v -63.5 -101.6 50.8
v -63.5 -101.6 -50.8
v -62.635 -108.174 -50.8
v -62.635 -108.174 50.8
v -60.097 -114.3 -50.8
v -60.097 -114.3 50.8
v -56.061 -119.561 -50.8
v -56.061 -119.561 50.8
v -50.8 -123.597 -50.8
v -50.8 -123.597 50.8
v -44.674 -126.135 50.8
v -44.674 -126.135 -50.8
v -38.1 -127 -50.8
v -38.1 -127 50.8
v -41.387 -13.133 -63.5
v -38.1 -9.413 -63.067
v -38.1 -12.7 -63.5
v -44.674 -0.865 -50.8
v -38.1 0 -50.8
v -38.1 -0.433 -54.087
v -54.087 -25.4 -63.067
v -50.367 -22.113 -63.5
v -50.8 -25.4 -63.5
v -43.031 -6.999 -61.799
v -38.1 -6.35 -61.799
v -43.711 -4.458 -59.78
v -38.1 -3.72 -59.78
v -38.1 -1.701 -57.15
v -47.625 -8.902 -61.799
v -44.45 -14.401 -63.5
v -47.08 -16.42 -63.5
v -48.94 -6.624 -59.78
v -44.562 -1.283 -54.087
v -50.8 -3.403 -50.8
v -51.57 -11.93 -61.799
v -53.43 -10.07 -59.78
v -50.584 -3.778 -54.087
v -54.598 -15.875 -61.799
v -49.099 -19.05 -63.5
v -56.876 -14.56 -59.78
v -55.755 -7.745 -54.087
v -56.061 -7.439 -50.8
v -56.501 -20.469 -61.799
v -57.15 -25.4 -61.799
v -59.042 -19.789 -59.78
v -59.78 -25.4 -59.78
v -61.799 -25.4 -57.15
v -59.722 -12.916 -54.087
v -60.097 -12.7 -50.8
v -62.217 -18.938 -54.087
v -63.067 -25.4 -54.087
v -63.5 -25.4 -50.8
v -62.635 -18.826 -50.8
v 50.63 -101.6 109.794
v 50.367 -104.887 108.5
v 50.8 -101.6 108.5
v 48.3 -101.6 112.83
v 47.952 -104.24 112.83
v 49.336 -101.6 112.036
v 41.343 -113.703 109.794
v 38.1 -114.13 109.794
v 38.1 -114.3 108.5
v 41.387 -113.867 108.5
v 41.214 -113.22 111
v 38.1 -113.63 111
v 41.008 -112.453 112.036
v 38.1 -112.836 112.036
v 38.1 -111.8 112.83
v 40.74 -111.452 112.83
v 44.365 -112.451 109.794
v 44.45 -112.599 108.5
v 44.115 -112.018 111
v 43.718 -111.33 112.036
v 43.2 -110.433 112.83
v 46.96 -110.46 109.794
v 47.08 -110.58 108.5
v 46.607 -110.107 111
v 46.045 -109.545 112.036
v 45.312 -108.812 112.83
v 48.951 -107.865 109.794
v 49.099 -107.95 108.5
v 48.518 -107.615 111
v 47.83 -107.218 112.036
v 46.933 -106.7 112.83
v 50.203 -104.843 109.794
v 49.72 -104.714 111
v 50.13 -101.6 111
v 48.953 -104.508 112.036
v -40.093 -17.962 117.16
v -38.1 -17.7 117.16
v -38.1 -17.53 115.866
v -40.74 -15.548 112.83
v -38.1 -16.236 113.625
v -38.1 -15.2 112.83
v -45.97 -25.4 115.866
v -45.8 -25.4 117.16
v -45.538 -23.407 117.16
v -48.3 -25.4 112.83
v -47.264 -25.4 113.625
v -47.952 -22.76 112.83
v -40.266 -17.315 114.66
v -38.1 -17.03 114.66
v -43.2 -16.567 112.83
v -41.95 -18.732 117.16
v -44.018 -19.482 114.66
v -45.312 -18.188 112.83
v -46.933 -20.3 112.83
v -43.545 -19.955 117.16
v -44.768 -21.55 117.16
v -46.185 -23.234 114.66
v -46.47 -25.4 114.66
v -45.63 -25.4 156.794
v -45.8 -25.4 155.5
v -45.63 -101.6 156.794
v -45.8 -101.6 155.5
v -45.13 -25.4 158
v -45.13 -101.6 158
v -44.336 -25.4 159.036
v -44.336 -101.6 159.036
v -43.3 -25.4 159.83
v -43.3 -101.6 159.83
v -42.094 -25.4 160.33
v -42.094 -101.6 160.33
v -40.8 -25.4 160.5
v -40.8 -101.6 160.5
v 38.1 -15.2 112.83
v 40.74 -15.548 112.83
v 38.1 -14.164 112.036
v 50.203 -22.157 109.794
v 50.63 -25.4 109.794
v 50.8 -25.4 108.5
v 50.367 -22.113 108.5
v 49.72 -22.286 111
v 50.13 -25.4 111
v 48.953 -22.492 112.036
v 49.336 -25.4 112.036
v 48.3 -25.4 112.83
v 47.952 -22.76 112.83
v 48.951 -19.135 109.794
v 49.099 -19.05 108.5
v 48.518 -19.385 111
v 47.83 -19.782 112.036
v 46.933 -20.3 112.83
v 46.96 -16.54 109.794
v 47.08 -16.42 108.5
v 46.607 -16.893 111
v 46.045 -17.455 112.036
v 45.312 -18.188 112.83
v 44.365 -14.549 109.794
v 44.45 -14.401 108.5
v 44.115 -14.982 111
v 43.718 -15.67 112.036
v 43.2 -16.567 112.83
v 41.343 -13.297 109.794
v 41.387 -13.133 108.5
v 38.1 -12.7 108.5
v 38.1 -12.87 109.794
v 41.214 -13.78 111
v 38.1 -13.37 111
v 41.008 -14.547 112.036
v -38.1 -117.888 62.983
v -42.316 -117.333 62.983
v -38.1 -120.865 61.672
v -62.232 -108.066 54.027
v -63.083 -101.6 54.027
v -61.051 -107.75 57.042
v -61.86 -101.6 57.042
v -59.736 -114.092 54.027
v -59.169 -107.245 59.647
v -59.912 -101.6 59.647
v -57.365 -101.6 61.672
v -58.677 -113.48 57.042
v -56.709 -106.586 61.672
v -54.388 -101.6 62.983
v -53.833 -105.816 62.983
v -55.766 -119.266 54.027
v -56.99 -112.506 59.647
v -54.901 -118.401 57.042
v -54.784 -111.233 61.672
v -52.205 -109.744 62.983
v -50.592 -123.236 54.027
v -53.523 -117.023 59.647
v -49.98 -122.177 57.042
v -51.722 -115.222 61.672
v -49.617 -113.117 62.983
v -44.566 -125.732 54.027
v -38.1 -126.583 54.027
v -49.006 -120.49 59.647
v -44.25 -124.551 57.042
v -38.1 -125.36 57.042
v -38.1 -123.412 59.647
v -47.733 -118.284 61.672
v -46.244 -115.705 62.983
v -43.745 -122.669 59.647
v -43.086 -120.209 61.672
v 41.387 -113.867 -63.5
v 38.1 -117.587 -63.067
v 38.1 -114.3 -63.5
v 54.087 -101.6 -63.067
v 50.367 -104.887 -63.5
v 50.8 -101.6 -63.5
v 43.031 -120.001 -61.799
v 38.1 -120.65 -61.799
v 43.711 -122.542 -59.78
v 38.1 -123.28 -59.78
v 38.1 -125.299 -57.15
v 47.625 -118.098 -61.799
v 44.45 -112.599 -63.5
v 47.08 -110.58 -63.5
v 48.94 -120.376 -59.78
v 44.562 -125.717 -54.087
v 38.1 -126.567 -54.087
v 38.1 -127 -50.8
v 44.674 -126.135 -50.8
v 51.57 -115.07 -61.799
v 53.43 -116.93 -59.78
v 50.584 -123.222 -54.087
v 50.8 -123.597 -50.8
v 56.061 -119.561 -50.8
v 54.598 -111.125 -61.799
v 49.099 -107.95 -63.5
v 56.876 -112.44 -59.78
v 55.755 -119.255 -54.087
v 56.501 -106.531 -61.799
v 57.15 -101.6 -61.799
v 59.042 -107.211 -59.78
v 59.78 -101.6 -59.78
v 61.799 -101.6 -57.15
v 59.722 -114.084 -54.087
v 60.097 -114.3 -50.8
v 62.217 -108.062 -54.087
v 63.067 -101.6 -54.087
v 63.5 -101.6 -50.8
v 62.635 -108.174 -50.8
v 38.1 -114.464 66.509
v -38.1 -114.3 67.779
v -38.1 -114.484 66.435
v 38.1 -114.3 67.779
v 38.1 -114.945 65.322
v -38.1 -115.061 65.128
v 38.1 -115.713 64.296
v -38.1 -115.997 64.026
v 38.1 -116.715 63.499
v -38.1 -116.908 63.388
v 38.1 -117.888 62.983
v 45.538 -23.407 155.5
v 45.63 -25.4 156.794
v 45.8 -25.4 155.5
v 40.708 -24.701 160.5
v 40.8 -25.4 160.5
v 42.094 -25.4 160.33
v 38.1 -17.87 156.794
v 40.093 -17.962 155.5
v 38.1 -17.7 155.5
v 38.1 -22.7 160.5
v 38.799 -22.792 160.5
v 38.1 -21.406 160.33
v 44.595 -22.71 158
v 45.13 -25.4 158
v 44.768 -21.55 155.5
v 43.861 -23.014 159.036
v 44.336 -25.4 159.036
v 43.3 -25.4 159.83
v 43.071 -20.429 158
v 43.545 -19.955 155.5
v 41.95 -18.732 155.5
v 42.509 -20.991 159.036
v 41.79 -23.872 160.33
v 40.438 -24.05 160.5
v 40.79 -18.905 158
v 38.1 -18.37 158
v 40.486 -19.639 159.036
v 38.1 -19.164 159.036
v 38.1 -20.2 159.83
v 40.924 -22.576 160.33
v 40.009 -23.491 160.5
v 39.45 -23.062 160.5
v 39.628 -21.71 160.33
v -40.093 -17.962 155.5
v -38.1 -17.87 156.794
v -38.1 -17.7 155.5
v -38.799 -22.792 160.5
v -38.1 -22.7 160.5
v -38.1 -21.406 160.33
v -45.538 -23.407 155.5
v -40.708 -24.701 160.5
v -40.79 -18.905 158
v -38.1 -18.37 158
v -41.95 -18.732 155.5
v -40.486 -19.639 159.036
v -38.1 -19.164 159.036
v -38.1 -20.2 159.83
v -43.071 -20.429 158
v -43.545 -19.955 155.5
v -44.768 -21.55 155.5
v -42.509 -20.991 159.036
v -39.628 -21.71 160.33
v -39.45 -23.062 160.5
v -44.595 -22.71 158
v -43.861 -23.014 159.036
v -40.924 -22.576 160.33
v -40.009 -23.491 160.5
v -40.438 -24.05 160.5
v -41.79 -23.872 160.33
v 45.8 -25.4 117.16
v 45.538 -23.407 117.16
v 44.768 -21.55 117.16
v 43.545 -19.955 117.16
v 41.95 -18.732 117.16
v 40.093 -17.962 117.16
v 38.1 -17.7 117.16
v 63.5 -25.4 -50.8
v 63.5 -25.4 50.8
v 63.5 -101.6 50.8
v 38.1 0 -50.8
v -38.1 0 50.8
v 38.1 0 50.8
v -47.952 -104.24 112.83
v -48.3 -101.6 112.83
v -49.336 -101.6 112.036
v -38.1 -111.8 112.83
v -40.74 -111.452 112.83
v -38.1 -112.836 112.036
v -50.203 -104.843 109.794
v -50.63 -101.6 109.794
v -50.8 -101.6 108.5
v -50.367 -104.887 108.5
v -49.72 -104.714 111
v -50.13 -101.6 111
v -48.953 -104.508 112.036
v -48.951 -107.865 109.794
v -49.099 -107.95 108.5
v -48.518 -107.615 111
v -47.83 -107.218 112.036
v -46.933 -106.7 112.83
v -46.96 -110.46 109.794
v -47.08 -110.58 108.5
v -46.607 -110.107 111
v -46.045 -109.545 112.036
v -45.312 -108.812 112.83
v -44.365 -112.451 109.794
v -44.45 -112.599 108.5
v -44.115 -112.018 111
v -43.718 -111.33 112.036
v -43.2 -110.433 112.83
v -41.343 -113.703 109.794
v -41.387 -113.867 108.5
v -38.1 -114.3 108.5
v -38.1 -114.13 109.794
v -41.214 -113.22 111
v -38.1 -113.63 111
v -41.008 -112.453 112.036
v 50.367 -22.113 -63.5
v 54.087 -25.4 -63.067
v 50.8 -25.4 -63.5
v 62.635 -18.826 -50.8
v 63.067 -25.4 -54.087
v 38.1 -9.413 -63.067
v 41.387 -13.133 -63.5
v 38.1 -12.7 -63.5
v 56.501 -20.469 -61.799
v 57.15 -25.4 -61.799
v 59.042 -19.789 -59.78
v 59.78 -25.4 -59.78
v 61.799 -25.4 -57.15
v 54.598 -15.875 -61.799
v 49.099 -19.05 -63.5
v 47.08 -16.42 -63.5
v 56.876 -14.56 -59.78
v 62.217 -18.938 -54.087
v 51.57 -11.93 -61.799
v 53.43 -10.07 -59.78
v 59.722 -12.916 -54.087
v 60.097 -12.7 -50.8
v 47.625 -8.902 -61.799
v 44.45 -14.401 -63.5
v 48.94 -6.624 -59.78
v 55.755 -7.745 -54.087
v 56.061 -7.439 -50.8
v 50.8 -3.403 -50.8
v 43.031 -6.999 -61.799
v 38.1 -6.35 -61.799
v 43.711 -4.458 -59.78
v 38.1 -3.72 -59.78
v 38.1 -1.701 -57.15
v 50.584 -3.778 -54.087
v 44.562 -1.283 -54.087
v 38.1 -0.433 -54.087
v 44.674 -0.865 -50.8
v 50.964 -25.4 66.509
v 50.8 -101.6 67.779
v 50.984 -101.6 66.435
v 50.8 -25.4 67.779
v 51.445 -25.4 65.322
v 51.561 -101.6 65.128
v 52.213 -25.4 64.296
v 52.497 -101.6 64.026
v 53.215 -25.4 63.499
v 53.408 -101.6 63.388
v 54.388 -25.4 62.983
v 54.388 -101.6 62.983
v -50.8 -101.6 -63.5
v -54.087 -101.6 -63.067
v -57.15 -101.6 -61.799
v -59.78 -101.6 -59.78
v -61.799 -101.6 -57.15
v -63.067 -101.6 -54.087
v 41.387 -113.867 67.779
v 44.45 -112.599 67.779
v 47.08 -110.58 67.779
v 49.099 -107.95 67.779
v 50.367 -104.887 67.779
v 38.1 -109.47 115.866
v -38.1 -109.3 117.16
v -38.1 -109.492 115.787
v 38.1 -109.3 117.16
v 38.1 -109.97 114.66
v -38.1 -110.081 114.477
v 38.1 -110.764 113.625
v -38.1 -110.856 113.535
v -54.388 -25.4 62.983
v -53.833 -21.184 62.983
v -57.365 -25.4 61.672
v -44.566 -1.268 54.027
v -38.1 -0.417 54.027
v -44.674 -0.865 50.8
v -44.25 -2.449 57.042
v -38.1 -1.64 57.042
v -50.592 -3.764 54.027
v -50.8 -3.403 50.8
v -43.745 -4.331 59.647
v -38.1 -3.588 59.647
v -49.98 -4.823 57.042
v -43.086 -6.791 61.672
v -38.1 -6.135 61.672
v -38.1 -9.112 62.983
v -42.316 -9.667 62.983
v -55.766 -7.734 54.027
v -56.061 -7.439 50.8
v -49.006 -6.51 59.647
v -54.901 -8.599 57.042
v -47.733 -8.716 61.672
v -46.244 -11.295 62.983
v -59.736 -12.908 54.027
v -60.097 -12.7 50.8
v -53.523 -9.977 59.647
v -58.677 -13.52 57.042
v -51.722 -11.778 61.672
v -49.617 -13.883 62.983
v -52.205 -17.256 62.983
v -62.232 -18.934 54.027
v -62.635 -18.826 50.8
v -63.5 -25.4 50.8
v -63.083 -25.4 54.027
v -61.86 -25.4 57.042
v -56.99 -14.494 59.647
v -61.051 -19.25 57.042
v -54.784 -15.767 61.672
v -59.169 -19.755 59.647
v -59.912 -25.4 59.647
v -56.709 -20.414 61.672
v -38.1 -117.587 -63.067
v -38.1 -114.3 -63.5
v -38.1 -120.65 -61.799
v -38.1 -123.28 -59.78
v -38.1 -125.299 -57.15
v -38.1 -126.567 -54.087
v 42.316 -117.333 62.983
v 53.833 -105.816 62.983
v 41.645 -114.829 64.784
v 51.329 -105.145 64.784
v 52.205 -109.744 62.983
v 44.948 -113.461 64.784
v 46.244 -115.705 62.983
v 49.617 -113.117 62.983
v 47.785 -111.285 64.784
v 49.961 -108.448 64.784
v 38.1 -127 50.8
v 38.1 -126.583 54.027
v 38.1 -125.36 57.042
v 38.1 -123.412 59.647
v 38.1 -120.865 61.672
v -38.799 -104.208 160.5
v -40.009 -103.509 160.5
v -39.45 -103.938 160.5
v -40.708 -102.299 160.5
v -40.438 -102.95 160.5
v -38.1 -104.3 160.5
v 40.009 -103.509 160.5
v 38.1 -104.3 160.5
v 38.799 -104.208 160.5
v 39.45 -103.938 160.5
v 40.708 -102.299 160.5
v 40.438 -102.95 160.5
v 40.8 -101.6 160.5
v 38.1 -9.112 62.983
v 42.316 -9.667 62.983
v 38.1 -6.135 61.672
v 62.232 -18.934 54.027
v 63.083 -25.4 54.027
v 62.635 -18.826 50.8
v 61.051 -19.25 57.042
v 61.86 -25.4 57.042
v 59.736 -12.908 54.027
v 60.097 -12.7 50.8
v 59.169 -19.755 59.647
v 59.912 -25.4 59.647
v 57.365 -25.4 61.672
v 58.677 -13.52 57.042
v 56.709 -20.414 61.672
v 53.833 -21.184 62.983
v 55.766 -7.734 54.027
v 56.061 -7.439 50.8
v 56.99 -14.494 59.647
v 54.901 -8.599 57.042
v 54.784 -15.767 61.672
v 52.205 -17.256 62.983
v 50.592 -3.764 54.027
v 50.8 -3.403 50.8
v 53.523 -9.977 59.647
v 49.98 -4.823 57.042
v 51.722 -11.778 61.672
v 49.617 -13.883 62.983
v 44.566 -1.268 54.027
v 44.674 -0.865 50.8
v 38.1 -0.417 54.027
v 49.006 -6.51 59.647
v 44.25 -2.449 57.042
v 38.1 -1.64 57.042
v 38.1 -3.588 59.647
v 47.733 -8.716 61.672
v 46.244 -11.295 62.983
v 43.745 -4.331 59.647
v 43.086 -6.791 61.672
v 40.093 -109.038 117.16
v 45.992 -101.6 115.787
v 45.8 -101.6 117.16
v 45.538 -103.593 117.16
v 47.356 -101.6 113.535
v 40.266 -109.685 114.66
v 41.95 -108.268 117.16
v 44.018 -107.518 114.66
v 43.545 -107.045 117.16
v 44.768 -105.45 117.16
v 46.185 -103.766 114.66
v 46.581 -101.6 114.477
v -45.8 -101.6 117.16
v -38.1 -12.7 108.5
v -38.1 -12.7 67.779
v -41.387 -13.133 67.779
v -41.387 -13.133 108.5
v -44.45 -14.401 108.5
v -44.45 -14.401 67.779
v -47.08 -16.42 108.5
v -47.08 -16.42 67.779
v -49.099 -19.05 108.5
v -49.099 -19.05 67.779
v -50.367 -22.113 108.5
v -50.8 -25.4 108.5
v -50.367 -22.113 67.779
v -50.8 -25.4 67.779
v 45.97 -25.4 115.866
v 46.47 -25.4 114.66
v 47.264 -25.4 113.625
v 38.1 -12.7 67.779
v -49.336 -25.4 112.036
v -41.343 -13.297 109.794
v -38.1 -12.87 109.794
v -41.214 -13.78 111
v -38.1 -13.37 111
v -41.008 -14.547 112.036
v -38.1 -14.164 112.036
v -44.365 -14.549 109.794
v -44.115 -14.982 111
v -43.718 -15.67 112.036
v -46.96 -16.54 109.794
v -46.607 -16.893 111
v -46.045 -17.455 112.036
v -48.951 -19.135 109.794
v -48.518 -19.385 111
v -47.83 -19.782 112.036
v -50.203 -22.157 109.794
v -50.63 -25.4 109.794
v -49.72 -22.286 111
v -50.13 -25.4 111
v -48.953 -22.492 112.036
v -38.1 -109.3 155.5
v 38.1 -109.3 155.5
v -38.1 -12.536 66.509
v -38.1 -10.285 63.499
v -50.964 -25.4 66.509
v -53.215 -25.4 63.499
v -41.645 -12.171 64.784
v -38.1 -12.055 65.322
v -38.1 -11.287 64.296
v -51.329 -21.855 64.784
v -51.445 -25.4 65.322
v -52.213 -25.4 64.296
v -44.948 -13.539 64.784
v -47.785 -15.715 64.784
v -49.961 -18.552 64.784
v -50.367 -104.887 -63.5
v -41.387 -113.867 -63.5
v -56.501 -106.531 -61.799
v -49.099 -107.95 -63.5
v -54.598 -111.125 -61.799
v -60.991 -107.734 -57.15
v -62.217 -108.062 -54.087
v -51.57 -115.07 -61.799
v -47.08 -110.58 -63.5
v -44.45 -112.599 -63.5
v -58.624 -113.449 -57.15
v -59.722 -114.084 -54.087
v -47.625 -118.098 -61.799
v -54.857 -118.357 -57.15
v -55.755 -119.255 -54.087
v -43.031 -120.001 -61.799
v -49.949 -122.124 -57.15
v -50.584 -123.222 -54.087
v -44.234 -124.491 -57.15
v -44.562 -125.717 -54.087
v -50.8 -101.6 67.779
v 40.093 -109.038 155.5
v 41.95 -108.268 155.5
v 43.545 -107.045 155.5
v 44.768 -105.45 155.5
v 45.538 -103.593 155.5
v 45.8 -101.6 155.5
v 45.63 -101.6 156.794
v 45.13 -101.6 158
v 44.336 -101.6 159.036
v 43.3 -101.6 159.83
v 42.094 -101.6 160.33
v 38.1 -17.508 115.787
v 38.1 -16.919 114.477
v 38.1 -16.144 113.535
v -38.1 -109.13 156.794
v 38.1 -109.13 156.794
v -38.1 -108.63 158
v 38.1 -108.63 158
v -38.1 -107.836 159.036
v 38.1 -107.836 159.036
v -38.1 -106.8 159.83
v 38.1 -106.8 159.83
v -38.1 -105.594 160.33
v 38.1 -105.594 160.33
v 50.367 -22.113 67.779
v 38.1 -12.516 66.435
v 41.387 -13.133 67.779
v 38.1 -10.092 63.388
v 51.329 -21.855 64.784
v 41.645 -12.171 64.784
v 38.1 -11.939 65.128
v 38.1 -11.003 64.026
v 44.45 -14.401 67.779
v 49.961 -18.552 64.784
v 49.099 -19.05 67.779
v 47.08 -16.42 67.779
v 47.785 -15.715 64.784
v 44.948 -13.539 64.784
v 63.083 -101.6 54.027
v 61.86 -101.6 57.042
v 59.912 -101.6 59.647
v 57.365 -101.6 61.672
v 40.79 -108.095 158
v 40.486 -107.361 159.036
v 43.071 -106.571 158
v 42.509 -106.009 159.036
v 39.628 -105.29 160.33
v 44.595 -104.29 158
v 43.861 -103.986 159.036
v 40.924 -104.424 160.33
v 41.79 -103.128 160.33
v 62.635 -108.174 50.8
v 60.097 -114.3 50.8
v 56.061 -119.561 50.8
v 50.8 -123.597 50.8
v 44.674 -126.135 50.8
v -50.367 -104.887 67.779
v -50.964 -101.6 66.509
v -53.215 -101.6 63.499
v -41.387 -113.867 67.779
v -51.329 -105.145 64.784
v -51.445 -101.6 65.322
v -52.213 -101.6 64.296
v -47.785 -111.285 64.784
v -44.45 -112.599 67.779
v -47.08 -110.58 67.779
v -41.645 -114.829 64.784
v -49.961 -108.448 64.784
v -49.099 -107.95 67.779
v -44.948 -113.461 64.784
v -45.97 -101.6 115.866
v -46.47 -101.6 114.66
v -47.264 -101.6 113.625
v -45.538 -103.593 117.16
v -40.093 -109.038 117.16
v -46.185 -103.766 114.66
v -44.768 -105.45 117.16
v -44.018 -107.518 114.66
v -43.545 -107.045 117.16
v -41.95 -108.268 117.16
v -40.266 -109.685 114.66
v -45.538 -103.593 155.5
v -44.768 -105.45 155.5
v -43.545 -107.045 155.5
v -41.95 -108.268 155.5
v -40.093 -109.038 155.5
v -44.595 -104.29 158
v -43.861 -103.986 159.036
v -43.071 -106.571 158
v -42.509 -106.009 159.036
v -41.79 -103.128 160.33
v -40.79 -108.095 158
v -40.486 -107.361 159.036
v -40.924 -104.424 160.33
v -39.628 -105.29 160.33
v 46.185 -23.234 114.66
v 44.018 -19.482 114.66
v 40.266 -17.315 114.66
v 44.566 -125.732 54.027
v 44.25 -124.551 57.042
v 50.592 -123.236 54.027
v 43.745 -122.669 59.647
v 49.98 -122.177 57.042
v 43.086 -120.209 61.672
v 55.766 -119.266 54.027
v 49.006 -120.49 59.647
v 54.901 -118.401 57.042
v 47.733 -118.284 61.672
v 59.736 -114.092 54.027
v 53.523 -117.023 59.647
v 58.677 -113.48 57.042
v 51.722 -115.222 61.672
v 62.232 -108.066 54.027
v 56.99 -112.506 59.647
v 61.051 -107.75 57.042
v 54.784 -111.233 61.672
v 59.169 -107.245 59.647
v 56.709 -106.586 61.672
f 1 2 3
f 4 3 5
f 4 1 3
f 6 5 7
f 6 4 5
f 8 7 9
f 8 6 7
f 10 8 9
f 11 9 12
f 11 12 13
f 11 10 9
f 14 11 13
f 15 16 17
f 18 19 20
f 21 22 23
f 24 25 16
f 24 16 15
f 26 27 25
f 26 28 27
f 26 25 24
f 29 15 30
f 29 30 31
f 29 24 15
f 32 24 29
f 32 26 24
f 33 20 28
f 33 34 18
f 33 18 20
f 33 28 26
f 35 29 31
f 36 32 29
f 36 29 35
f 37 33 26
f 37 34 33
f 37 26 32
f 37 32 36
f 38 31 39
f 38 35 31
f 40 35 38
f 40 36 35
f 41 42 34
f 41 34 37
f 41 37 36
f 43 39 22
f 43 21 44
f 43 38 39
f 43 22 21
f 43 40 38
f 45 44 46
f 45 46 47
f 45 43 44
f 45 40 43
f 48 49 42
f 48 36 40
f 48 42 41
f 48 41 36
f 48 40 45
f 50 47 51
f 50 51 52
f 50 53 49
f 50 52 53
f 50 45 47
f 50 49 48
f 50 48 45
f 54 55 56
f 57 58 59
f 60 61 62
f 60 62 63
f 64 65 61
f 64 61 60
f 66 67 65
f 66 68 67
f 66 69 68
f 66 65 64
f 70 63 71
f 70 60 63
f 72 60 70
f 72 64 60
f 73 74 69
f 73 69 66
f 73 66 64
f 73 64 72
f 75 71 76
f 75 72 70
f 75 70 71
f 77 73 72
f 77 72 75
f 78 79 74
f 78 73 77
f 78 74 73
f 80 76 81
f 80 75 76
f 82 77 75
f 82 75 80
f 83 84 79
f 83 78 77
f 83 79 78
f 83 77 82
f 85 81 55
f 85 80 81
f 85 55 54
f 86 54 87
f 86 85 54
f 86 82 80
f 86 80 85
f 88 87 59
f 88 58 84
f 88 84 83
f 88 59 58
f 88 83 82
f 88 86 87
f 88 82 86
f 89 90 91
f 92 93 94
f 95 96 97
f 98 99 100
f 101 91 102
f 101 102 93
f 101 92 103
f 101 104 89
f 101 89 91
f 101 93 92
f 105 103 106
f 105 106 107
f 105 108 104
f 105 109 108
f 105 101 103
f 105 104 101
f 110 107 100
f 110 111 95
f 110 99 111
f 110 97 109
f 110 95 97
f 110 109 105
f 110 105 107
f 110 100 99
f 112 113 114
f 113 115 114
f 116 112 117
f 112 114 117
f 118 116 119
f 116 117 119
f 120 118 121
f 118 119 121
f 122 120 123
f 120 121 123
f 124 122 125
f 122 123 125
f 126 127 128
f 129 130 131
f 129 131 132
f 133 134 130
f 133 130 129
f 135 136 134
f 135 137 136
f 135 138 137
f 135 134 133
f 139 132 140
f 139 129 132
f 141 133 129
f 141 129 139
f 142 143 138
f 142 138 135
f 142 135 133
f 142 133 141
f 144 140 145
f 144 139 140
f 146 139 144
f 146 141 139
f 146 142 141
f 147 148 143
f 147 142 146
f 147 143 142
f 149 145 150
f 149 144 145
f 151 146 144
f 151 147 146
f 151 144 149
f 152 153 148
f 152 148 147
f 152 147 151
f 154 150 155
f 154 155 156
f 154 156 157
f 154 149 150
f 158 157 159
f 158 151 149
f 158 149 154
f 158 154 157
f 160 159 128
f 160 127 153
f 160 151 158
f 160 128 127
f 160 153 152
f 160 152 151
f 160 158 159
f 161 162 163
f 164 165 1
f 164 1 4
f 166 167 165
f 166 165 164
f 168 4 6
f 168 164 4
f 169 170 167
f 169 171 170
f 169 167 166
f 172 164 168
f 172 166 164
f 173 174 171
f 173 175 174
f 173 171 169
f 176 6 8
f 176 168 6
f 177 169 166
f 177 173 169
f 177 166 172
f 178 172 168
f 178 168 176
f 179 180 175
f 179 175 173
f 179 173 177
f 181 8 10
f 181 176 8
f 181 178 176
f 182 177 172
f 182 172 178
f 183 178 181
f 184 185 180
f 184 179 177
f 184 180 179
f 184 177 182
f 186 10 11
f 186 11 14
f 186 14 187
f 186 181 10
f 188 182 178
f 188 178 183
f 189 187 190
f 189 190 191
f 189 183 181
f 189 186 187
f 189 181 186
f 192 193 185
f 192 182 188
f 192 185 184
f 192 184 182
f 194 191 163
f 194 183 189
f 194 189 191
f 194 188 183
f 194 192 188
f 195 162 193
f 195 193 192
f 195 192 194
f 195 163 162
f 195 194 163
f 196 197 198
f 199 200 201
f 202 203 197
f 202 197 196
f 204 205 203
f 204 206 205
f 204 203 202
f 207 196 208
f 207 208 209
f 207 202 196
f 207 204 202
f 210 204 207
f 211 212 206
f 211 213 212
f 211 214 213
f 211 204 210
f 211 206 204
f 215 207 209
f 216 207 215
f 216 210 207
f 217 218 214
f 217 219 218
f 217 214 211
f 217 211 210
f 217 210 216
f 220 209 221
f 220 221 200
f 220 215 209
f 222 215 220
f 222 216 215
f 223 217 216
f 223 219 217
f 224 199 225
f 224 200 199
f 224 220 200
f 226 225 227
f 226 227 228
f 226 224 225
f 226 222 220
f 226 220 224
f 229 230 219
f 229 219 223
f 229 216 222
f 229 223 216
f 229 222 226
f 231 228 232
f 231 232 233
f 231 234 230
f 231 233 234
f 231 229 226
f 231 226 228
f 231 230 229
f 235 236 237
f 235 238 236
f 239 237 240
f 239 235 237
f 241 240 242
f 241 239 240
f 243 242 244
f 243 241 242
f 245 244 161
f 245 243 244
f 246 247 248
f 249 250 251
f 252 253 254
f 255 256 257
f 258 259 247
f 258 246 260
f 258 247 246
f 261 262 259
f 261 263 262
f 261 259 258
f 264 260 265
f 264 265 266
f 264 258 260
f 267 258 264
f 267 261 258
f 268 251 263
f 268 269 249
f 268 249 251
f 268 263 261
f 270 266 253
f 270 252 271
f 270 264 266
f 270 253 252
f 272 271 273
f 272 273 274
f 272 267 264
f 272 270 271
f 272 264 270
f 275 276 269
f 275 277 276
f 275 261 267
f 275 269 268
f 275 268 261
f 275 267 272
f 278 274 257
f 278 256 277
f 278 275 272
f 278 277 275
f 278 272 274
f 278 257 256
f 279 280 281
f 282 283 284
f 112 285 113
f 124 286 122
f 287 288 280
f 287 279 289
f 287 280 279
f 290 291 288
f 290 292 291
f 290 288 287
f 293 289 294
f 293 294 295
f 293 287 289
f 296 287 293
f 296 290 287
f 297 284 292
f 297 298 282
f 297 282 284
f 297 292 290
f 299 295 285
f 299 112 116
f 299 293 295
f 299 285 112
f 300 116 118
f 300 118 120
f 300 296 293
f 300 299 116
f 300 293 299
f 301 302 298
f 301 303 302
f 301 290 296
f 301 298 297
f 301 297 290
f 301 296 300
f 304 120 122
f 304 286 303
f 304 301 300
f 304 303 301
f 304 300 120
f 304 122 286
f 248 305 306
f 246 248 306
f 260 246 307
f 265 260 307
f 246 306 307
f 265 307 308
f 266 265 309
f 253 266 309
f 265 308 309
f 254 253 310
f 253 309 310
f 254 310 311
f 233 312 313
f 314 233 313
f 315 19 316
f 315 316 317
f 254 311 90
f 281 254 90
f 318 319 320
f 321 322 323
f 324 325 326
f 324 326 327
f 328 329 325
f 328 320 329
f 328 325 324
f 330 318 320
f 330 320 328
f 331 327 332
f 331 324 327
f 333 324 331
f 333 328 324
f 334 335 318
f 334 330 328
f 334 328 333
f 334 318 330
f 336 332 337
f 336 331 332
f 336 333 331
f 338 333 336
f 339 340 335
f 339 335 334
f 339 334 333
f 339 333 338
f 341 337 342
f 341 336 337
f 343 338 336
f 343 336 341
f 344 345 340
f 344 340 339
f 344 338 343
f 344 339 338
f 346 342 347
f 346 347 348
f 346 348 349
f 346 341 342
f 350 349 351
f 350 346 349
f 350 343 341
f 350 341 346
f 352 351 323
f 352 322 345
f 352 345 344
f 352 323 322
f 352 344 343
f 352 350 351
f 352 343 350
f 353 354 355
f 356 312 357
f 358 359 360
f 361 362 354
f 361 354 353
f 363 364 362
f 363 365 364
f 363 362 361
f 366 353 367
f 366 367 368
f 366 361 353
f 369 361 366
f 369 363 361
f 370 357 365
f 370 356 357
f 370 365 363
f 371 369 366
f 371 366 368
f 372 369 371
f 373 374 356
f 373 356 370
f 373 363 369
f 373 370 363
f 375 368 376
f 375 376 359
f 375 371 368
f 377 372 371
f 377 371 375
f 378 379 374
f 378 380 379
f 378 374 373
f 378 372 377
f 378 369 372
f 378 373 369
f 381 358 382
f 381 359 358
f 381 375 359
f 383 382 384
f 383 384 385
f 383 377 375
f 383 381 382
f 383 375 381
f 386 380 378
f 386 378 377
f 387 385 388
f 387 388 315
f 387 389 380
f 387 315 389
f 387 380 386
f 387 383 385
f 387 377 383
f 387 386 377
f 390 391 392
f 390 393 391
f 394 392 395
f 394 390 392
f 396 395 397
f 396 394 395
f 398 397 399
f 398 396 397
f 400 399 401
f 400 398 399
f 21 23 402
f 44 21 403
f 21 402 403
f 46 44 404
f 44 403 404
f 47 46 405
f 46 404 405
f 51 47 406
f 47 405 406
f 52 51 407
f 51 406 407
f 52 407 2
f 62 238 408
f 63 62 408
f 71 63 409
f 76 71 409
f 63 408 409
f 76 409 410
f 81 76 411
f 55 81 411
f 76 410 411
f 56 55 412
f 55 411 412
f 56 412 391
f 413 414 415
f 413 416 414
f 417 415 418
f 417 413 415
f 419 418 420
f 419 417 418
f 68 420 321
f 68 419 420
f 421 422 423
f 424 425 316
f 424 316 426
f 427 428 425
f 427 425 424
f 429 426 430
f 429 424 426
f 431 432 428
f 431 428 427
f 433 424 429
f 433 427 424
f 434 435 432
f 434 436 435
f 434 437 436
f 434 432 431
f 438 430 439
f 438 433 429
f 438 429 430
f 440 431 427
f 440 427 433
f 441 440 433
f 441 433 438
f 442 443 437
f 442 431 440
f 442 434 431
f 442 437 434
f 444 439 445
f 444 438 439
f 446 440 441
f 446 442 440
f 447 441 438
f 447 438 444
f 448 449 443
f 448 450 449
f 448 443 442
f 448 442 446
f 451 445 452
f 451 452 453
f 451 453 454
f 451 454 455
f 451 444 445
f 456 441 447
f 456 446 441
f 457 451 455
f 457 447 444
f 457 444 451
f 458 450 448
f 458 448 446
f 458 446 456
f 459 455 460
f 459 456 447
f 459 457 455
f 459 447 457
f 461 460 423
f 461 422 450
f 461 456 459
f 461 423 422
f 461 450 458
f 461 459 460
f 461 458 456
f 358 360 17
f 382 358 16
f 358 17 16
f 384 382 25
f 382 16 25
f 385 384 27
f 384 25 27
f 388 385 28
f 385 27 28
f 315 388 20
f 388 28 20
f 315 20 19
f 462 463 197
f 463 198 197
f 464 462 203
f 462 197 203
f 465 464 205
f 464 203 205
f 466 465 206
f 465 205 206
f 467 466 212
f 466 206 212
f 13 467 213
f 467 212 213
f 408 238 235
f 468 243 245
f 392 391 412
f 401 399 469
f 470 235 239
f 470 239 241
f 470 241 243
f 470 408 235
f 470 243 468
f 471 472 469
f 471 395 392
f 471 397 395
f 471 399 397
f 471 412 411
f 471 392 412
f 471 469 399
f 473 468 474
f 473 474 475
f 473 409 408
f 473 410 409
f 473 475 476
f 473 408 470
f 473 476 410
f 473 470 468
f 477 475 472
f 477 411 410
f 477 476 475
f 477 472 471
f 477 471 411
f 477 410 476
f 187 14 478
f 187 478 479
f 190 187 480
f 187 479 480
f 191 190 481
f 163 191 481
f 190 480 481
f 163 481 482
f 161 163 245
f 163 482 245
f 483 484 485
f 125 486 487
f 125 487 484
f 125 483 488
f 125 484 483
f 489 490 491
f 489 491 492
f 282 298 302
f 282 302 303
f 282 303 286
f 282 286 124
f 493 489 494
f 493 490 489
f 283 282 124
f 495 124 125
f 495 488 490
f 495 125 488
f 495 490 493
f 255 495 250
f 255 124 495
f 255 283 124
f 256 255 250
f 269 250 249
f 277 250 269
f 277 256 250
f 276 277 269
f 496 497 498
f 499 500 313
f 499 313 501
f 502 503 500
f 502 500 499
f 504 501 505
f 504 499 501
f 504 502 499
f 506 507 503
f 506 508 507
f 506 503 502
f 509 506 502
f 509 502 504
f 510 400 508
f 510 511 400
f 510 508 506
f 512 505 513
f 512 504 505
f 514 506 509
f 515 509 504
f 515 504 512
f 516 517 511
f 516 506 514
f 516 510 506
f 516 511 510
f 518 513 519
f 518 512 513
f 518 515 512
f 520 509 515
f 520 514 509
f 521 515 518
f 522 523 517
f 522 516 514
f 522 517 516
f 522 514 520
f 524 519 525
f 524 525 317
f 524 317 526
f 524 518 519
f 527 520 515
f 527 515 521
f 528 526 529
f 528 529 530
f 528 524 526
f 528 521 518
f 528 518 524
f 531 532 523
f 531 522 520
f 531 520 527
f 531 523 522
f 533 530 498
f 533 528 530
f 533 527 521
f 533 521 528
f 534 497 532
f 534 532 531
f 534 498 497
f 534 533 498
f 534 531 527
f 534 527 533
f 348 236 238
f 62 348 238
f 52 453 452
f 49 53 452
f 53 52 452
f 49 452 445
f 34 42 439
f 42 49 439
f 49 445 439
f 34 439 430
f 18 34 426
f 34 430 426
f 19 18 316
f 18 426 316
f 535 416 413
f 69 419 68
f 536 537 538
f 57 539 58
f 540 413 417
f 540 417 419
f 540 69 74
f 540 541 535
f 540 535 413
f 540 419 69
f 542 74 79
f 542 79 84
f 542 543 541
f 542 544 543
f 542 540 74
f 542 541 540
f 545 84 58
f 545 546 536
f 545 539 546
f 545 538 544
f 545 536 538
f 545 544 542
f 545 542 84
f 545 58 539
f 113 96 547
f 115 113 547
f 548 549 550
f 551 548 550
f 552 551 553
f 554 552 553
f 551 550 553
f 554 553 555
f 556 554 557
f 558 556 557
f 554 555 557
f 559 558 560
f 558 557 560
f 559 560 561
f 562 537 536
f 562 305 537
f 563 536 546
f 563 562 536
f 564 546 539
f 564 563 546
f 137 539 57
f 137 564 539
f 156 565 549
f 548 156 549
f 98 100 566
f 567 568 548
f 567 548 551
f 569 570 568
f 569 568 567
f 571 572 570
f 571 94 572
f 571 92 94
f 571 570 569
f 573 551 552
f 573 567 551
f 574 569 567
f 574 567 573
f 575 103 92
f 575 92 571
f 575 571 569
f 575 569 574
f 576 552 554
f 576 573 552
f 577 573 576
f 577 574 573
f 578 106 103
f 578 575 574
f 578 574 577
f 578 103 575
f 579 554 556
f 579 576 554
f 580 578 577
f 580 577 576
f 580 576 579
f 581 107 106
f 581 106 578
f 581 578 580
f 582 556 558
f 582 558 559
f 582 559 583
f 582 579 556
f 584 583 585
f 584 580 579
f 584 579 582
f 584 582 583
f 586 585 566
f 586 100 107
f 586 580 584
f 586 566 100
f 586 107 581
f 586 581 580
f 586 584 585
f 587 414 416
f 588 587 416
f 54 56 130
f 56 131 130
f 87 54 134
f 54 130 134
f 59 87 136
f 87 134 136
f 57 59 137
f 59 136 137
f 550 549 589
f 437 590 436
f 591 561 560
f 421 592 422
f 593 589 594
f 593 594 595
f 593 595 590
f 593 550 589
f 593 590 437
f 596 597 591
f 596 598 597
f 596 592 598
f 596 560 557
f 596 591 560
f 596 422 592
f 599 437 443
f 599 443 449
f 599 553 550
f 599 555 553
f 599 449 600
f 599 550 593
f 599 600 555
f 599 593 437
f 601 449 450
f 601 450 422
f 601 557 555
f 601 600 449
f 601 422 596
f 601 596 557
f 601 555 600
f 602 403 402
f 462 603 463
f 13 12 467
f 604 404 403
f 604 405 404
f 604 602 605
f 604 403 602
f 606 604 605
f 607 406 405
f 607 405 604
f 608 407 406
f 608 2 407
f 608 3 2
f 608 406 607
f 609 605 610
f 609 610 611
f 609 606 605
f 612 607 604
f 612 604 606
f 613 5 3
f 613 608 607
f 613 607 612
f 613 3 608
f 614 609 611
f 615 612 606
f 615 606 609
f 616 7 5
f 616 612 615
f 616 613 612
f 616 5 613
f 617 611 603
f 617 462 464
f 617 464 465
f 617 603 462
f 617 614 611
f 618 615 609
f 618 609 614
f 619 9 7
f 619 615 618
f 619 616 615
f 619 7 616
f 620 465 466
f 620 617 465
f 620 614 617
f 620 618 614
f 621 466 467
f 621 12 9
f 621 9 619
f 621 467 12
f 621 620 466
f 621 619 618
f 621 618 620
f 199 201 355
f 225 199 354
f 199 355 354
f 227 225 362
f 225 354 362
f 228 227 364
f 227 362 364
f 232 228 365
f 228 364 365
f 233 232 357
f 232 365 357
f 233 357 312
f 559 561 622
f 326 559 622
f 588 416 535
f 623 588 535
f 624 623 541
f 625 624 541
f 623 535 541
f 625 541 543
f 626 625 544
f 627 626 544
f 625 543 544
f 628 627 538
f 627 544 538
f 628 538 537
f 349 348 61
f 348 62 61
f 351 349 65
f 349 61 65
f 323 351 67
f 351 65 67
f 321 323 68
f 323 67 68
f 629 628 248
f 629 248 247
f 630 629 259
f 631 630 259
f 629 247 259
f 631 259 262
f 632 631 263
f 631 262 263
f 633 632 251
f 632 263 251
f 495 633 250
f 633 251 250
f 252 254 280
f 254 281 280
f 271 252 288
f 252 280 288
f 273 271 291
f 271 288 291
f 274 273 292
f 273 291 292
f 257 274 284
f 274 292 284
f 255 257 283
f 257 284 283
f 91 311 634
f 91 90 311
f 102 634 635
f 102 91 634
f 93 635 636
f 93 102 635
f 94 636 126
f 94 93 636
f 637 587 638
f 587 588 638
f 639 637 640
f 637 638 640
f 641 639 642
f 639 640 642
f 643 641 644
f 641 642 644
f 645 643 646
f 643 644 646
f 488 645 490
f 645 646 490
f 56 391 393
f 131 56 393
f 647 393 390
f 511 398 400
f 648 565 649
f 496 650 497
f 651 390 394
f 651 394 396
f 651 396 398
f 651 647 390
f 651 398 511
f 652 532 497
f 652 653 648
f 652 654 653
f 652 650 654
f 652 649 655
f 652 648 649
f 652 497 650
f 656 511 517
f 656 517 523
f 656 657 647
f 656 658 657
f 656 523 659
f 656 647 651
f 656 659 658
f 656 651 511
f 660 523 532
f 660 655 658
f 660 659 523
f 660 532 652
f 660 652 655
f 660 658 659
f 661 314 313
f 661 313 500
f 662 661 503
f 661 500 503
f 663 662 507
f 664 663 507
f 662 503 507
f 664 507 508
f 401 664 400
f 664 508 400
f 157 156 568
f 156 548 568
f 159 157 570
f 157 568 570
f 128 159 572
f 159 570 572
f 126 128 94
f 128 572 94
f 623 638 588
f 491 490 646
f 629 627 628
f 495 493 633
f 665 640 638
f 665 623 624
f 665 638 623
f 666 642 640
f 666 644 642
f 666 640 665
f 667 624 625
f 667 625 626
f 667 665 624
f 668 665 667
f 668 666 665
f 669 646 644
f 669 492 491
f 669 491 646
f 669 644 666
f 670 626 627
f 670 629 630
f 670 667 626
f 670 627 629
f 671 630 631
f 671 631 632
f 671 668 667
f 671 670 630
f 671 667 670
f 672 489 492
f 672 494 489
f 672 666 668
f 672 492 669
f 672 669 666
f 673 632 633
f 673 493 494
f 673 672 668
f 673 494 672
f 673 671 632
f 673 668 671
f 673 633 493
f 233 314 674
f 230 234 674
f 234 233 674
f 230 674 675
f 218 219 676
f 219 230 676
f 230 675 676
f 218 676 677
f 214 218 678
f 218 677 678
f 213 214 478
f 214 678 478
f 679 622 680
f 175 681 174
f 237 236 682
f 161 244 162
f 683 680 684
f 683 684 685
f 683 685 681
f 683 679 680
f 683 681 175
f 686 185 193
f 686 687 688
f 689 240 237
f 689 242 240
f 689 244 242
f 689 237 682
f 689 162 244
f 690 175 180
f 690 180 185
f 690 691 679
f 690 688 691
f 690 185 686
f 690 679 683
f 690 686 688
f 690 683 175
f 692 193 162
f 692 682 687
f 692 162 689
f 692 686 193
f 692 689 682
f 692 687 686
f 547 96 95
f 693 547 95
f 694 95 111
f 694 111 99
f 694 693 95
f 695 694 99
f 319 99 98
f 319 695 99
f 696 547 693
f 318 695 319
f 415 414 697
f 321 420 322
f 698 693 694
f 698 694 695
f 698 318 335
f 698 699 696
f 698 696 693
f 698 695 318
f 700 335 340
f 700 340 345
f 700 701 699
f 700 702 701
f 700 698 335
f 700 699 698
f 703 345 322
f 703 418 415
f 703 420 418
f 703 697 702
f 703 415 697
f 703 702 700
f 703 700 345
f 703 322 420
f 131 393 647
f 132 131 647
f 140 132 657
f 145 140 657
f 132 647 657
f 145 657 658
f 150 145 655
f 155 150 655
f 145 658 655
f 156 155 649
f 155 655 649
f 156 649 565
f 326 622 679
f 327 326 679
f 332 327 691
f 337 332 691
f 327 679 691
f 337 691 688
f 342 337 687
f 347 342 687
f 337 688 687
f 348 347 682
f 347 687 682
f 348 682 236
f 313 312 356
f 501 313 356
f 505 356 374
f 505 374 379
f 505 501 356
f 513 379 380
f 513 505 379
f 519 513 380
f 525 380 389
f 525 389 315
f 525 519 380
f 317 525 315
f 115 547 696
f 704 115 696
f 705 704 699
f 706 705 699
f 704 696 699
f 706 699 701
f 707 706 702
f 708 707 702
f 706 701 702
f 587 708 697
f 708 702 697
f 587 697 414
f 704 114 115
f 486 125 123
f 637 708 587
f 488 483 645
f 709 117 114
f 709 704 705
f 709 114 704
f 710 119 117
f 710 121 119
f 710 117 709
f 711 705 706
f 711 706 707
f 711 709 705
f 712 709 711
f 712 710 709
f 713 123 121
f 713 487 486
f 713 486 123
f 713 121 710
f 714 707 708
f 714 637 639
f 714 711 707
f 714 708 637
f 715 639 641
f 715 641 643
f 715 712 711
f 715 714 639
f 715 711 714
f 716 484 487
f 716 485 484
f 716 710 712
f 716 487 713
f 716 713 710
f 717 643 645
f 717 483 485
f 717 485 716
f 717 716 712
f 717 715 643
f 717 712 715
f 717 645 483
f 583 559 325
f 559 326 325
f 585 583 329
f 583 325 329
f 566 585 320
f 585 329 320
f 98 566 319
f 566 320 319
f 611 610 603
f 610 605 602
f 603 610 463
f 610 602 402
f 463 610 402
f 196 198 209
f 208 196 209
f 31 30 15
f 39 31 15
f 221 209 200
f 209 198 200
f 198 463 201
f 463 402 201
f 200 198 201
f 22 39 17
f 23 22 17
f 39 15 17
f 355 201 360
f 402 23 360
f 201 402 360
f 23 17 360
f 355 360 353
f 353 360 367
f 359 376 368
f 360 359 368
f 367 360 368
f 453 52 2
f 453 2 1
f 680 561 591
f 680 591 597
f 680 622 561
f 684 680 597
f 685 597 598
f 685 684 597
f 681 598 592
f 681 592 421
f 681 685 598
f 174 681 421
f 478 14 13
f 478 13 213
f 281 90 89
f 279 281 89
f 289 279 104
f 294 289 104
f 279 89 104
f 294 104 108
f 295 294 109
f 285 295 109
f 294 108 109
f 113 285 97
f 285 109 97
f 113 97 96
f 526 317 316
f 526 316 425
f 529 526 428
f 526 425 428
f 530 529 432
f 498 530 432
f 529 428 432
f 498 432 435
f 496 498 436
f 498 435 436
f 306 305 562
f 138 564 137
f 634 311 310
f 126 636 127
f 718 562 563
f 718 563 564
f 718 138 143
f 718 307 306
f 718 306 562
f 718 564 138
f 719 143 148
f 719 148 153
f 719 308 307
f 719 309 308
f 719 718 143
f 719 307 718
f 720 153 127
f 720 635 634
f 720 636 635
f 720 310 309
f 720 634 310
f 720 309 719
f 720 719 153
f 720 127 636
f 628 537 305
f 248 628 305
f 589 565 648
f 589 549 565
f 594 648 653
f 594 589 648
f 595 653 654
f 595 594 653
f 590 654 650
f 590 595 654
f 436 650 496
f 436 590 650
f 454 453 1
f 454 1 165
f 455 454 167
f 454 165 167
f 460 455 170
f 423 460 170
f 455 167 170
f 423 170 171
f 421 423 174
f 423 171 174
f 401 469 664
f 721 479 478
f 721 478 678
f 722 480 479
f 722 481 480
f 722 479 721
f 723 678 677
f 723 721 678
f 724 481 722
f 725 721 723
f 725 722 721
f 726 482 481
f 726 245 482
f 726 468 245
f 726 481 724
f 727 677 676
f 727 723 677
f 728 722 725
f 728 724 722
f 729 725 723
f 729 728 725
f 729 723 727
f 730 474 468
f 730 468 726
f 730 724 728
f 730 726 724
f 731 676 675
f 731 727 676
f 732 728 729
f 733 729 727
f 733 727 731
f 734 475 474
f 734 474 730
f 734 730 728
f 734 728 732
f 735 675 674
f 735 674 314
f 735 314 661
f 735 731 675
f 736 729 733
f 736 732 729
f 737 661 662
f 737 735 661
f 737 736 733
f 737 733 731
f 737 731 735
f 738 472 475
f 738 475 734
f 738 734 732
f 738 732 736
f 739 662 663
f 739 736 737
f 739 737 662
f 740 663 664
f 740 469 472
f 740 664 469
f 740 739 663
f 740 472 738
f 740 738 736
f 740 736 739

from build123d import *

# Parameters (mm, degrees)
F0_W     = 127
F0_H     = 127
F1_DEPTH = 127
F2_R     = 25.4
F3_R     = 12.7
F4_DEPTH = 50
F5_R     = 5
F6_DEPTH = 47
F7_R     = 5


# Not quite as in the source:
# - two fillets or chamfers of one size are made in one step


with BuildPart() as f1:
    # F0 (on Front) → F1 (new body)
    with BuildSketch(Plane.XZ):
        Rectangle(F0_W, F0_H)
    extrude(amount=F1_DEPTH)

    # F2
    f2_edges = [f1.edges().sort_by_distance(p)[0] for p in [
        (-63.5, -127, 0),
        (63.5, -127, 0),
        (-63.5, 0, 0),
        (63.5, 0, 0),
    ]]
    fillet(f2_edges, radius=F2_R)

    # F3
    f3_edges = [f1.edges().sort_by_distance(p)[0] for p in [
        (-63.5, -63.5, 63.5),
        (0, -127, -63.5),
        (63.5, -63.5, -63.5),
        (56.060512, -7.439488, -63.5),
        (56.060512, -119.560512, -63.5),
        (0, 0, -63.5),
        (-56.060512, -7.439488, -63.5),
        (-56.060512, -119.560512, -63.5),
        (-63.5, -63.5, -63.5),
    ]]
    fillet(f3_edges, radius=F3_R)

    # F4 (add): a face of the model
    f4_faces = [f1.faces().sort_by_distance(p)[0] for p in [
        (0, -63.5, 63.5),
    ]]
    extrude(f4_faces, amount=F4_DEPTH)

    # F5
    f5_edges = [f1.edges().sort_by_distance(p)[0] for p in [
        (-50.8, -63.5, 63.5),
        (-47.080256, -16.419744, 63.5),
        (-50.8, -63.5, 113.5),
        (-47.080256, -110.580256, 63.5),
        (0, -12.7, 63.5),
        (-47.080256, -16.419744, 113.5),
        (-47.080256, -110.580256, 113.5),
        (0, -12.7, 113.5),
        (0, -114.3, 113.5),
        (47.080256, -16.419744, 113.5),
        (47.080256, -110.580256, 113.5),
        (50.8, -63.5, 113.5),
        (0, -114.3, 63.5),
        (47.080256, -16.419744, 63.5),
        (47.080256, -110.580256, 63.5),
        (50.8, -63.5, 63.5),
    ]]
    fillet(f5_edges, radius=F5_R)

    # F6 (add): a face of the model
    f6_faces = [f1.faces().sort_by_distance(p)[0] for p in [
        (0, -63.5, 113.5),
    ]]
    extrude(f6_faces, amount=F6_DEPTH)

    # F7
    f7_edges = [f1.edges().sort_by_distance(p)[0] for p in [
        (-45.8, -63.5, 113.5),
        (-43.544722, -19.955278, 113.5),
        (-45.8, -63.5, 160.5),
        (-43.544722, -107.044722, 113.5),
        (0, -17.7, 113.5),
        (-43.544722, -19.955278, 160.5),
        (-43.544722, -107.044722, 160.5),
        (0, -17.7, 160.5),
        (0, -109.3, 160.5),
        (43.544722, -19.955278, 160.5),
        (43.544722, -107.044722, 160.5),
        (45.8, -63.5, 160.5),
        (0, -109.3, 113.5),
        (43.544722, -19.955278, 113.5),
        (43.544722, -107.044722, 113.5),
        (45.8, -63.5, 113.5),
    ]]
    fillet(f7_edges, radius=F7_R)


solid = f1.part
